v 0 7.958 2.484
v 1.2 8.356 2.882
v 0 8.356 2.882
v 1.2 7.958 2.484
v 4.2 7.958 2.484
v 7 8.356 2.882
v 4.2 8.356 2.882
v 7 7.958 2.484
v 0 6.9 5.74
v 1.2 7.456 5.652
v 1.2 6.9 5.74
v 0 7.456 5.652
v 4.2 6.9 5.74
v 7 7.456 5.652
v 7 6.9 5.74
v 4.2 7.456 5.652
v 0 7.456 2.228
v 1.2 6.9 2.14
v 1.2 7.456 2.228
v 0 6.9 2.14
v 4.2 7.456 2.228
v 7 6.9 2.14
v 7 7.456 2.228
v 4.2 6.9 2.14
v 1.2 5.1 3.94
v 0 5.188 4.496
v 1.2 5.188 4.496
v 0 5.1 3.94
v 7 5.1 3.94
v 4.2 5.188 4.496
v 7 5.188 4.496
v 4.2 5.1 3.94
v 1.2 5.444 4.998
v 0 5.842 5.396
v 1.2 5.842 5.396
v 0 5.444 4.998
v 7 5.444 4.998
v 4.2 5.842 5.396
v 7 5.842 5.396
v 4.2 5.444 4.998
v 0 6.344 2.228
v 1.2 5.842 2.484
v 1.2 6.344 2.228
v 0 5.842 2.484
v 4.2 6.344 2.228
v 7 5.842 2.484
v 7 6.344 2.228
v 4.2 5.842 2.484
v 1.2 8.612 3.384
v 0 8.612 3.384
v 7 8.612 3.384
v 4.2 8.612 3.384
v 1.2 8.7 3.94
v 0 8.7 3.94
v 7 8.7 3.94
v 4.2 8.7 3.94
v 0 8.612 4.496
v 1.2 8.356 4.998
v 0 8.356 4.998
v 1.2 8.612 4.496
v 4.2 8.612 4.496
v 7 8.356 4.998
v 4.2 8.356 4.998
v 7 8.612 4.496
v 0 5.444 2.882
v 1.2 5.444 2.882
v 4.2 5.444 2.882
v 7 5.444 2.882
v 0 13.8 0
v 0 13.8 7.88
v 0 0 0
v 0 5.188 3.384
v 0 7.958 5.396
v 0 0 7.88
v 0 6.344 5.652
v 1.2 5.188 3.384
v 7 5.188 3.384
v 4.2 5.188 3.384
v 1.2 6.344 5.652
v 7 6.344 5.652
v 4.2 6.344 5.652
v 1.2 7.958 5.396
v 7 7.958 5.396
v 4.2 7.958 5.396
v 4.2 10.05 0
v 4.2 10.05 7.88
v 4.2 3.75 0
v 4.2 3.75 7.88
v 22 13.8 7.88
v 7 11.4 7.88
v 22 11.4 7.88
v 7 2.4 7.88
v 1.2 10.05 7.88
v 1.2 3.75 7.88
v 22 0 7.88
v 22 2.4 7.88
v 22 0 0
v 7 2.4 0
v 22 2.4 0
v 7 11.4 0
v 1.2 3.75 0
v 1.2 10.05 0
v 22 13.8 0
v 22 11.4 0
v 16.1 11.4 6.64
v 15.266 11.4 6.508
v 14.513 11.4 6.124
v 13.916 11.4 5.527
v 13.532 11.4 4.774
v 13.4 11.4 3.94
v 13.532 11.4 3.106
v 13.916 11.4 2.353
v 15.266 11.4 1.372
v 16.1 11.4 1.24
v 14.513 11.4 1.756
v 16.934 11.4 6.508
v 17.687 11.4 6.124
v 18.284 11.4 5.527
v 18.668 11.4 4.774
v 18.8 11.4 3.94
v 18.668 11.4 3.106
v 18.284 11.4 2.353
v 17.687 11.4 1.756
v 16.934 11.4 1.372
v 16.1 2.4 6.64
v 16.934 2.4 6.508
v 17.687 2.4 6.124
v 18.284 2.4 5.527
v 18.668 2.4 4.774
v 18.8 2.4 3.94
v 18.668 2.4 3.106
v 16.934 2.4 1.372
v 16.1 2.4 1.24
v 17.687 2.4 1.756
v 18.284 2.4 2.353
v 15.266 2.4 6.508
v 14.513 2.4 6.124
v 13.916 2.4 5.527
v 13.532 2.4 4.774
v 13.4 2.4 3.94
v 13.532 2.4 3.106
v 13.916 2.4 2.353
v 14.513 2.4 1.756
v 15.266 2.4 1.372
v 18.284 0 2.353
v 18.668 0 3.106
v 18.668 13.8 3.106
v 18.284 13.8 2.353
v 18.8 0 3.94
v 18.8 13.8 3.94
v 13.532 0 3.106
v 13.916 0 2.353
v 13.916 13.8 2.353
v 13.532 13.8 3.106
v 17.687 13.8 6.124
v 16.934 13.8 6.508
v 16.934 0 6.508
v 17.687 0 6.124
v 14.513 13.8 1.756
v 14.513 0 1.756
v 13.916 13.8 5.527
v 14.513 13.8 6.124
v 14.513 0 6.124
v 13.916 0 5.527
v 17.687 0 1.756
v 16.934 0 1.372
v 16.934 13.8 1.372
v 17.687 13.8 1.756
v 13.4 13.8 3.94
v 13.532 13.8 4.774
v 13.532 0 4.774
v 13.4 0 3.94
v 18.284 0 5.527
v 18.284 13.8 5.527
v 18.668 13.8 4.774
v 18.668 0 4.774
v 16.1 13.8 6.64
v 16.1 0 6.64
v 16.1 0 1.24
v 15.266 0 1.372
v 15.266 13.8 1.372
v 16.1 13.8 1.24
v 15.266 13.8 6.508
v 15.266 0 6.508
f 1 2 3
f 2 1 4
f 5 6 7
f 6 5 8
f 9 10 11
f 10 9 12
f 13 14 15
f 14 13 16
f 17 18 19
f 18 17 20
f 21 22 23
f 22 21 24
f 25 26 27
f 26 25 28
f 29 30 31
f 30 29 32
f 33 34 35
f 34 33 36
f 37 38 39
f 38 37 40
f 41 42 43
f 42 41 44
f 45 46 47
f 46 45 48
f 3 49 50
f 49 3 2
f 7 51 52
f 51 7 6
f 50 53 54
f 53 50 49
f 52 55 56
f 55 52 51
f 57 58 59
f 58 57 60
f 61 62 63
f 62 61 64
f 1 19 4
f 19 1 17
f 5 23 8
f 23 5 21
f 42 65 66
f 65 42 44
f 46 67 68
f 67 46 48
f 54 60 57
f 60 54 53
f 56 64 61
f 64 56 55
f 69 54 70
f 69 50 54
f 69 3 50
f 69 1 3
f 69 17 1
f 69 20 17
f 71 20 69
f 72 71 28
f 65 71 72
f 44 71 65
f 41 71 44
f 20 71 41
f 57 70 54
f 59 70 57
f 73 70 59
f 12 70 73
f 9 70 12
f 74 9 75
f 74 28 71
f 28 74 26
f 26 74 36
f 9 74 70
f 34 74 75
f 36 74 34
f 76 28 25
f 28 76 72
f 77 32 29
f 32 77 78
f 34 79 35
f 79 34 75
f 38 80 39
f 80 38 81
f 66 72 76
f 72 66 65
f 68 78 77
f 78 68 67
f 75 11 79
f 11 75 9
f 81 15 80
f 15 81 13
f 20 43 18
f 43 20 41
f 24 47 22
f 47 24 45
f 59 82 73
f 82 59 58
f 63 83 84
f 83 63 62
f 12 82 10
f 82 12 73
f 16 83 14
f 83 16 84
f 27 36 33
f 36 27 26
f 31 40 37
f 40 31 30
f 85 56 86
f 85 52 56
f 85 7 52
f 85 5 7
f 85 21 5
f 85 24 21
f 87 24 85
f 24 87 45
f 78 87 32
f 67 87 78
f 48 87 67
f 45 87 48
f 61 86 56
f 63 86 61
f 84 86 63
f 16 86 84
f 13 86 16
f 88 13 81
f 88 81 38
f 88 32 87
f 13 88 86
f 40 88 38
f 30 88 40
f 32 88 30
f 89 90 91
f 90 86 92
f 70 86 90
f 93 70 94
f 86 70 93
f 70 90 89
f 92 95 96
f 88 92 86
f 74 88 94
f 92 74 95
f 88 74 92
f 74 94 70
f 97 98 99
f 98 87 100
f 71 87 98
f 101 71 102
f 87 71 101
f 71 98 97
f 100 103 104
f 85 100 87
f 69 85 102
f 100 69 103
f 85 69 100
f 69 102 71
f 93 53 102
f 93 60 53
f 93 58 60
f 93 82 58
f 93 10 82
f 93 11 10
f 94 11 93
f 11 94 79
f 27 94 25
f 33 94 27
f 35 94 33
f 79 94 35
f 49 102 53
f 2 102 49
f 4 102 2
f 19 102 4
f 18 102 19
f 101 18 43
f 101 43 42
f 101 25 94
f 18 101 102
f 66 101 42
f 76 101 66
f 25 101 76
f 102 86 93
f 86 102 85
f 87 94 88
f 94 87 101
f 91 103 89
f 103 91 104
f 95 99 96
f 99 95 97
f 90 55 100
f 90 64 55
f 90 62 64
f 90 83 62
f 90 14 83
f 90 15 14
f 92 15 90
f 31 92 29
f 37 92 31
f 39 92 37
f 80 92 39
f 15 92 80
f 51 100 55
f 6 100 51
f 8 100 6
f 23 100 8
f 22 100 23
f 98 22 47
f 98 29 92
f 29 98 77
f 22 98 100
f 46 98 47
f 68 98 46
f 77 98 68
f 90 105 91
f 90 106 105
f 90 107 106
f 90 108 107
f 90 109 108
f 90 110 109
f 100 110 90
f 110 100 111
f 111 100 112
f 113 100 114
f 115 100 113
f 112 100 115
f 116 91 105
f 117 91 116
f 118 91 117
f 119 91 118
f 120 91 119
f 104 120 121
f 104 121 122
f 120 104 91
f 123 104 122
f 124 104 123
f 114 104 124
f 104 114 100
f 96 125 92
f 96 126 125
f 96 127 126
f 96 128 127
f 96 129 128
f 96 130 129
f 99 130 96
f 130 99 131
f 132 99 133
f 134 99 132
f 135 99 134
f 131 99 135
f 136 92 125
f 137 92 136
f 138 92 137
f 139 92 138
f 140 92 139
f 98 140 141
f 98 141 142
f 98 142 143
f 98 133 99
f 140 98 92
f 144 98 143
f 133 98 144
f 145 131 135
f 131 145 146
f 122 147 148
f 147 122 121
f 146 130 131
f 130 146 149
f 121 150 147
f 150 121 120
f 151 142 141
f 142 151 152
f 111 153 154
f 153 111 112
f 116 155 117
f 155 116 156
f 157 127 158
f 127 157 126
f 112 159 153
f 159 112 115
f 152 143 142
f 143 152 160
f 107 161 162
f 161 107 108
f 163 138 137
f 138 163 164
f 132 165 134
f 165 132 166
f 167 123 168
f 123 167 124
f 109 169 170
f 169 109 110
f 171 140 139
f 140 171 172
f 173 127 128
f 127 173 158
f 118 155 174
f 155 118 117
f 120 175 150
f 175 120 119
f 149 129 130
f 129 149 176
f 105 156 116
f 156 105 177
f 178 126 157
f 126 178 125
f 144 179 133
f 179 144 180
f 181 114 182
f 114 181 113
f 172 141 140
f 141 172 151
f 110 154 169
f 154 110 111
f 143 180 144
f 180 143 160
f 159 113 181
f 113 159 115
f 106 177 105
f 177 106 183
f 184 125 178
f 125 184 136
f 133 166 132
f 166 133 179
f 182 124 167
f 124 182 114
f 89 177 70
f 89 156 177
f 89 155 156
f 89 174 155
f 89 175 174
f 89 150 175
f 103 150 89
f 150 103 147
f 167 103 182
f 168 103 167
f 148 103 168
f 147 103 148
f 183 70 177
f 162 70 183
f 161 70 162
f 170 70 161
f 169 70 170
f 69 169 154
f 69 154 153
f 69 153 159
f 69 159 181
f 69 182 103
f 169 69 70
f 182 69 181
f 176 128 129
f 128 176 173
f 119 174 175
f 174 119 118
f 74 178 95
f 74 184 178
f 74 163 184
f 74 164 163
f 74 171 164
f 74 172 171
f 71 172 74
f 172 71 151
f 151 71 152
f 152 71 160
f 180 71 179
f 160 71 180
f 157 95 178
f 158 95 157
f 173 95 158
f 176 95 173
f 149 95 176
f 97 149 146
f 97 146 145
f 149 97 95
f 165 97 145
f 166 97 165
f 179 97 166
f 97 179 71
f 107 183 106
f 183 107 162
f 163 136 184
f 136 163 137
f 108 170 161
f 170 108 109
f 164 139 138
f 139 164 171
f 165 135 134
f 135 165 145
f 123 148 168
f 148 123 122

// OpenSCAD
LH      =   0.248;  //layer height
EW      =   0.4;    //extrusion width
NW      =   6.3;    //nut width
NH      =   3;    //nut height
BCW     =   9;     //bearing cutout width y
BSR     =   2.7;     //bearing shaft radius
BCL     =   15;     //bearing cutout length X
height  =   BSR * 2 + 10 * LH;     //z
width   =   BCW + 12 * EW;     //y
length  =   22;     //x

echo ("total height = ",  height, "mm width = ", width,"mm"); 

difference(){
    cube([length,width,height]);
    
    union(){
        translate([0,width/2,height/2]) 
        rotate([0,90,0])
        cylinder(26,1.8,1.8, $fn=20); //tensioner hole
        
        translate([EW*3,(width-NW)/2,0])
        cube([NH,NW,height]); //captive nut hole
        
        translate([length-BCL,(width-BCW)/2,0])
        cube([BCL,BCW,height]); //bearing cutout
        
        translate([length-BCL+9.1,0,height/2])
        rotate([270,0,0])
        cylinder(width,BSR,BSR, $fn=20); //bearing shaft
    }
    
}
